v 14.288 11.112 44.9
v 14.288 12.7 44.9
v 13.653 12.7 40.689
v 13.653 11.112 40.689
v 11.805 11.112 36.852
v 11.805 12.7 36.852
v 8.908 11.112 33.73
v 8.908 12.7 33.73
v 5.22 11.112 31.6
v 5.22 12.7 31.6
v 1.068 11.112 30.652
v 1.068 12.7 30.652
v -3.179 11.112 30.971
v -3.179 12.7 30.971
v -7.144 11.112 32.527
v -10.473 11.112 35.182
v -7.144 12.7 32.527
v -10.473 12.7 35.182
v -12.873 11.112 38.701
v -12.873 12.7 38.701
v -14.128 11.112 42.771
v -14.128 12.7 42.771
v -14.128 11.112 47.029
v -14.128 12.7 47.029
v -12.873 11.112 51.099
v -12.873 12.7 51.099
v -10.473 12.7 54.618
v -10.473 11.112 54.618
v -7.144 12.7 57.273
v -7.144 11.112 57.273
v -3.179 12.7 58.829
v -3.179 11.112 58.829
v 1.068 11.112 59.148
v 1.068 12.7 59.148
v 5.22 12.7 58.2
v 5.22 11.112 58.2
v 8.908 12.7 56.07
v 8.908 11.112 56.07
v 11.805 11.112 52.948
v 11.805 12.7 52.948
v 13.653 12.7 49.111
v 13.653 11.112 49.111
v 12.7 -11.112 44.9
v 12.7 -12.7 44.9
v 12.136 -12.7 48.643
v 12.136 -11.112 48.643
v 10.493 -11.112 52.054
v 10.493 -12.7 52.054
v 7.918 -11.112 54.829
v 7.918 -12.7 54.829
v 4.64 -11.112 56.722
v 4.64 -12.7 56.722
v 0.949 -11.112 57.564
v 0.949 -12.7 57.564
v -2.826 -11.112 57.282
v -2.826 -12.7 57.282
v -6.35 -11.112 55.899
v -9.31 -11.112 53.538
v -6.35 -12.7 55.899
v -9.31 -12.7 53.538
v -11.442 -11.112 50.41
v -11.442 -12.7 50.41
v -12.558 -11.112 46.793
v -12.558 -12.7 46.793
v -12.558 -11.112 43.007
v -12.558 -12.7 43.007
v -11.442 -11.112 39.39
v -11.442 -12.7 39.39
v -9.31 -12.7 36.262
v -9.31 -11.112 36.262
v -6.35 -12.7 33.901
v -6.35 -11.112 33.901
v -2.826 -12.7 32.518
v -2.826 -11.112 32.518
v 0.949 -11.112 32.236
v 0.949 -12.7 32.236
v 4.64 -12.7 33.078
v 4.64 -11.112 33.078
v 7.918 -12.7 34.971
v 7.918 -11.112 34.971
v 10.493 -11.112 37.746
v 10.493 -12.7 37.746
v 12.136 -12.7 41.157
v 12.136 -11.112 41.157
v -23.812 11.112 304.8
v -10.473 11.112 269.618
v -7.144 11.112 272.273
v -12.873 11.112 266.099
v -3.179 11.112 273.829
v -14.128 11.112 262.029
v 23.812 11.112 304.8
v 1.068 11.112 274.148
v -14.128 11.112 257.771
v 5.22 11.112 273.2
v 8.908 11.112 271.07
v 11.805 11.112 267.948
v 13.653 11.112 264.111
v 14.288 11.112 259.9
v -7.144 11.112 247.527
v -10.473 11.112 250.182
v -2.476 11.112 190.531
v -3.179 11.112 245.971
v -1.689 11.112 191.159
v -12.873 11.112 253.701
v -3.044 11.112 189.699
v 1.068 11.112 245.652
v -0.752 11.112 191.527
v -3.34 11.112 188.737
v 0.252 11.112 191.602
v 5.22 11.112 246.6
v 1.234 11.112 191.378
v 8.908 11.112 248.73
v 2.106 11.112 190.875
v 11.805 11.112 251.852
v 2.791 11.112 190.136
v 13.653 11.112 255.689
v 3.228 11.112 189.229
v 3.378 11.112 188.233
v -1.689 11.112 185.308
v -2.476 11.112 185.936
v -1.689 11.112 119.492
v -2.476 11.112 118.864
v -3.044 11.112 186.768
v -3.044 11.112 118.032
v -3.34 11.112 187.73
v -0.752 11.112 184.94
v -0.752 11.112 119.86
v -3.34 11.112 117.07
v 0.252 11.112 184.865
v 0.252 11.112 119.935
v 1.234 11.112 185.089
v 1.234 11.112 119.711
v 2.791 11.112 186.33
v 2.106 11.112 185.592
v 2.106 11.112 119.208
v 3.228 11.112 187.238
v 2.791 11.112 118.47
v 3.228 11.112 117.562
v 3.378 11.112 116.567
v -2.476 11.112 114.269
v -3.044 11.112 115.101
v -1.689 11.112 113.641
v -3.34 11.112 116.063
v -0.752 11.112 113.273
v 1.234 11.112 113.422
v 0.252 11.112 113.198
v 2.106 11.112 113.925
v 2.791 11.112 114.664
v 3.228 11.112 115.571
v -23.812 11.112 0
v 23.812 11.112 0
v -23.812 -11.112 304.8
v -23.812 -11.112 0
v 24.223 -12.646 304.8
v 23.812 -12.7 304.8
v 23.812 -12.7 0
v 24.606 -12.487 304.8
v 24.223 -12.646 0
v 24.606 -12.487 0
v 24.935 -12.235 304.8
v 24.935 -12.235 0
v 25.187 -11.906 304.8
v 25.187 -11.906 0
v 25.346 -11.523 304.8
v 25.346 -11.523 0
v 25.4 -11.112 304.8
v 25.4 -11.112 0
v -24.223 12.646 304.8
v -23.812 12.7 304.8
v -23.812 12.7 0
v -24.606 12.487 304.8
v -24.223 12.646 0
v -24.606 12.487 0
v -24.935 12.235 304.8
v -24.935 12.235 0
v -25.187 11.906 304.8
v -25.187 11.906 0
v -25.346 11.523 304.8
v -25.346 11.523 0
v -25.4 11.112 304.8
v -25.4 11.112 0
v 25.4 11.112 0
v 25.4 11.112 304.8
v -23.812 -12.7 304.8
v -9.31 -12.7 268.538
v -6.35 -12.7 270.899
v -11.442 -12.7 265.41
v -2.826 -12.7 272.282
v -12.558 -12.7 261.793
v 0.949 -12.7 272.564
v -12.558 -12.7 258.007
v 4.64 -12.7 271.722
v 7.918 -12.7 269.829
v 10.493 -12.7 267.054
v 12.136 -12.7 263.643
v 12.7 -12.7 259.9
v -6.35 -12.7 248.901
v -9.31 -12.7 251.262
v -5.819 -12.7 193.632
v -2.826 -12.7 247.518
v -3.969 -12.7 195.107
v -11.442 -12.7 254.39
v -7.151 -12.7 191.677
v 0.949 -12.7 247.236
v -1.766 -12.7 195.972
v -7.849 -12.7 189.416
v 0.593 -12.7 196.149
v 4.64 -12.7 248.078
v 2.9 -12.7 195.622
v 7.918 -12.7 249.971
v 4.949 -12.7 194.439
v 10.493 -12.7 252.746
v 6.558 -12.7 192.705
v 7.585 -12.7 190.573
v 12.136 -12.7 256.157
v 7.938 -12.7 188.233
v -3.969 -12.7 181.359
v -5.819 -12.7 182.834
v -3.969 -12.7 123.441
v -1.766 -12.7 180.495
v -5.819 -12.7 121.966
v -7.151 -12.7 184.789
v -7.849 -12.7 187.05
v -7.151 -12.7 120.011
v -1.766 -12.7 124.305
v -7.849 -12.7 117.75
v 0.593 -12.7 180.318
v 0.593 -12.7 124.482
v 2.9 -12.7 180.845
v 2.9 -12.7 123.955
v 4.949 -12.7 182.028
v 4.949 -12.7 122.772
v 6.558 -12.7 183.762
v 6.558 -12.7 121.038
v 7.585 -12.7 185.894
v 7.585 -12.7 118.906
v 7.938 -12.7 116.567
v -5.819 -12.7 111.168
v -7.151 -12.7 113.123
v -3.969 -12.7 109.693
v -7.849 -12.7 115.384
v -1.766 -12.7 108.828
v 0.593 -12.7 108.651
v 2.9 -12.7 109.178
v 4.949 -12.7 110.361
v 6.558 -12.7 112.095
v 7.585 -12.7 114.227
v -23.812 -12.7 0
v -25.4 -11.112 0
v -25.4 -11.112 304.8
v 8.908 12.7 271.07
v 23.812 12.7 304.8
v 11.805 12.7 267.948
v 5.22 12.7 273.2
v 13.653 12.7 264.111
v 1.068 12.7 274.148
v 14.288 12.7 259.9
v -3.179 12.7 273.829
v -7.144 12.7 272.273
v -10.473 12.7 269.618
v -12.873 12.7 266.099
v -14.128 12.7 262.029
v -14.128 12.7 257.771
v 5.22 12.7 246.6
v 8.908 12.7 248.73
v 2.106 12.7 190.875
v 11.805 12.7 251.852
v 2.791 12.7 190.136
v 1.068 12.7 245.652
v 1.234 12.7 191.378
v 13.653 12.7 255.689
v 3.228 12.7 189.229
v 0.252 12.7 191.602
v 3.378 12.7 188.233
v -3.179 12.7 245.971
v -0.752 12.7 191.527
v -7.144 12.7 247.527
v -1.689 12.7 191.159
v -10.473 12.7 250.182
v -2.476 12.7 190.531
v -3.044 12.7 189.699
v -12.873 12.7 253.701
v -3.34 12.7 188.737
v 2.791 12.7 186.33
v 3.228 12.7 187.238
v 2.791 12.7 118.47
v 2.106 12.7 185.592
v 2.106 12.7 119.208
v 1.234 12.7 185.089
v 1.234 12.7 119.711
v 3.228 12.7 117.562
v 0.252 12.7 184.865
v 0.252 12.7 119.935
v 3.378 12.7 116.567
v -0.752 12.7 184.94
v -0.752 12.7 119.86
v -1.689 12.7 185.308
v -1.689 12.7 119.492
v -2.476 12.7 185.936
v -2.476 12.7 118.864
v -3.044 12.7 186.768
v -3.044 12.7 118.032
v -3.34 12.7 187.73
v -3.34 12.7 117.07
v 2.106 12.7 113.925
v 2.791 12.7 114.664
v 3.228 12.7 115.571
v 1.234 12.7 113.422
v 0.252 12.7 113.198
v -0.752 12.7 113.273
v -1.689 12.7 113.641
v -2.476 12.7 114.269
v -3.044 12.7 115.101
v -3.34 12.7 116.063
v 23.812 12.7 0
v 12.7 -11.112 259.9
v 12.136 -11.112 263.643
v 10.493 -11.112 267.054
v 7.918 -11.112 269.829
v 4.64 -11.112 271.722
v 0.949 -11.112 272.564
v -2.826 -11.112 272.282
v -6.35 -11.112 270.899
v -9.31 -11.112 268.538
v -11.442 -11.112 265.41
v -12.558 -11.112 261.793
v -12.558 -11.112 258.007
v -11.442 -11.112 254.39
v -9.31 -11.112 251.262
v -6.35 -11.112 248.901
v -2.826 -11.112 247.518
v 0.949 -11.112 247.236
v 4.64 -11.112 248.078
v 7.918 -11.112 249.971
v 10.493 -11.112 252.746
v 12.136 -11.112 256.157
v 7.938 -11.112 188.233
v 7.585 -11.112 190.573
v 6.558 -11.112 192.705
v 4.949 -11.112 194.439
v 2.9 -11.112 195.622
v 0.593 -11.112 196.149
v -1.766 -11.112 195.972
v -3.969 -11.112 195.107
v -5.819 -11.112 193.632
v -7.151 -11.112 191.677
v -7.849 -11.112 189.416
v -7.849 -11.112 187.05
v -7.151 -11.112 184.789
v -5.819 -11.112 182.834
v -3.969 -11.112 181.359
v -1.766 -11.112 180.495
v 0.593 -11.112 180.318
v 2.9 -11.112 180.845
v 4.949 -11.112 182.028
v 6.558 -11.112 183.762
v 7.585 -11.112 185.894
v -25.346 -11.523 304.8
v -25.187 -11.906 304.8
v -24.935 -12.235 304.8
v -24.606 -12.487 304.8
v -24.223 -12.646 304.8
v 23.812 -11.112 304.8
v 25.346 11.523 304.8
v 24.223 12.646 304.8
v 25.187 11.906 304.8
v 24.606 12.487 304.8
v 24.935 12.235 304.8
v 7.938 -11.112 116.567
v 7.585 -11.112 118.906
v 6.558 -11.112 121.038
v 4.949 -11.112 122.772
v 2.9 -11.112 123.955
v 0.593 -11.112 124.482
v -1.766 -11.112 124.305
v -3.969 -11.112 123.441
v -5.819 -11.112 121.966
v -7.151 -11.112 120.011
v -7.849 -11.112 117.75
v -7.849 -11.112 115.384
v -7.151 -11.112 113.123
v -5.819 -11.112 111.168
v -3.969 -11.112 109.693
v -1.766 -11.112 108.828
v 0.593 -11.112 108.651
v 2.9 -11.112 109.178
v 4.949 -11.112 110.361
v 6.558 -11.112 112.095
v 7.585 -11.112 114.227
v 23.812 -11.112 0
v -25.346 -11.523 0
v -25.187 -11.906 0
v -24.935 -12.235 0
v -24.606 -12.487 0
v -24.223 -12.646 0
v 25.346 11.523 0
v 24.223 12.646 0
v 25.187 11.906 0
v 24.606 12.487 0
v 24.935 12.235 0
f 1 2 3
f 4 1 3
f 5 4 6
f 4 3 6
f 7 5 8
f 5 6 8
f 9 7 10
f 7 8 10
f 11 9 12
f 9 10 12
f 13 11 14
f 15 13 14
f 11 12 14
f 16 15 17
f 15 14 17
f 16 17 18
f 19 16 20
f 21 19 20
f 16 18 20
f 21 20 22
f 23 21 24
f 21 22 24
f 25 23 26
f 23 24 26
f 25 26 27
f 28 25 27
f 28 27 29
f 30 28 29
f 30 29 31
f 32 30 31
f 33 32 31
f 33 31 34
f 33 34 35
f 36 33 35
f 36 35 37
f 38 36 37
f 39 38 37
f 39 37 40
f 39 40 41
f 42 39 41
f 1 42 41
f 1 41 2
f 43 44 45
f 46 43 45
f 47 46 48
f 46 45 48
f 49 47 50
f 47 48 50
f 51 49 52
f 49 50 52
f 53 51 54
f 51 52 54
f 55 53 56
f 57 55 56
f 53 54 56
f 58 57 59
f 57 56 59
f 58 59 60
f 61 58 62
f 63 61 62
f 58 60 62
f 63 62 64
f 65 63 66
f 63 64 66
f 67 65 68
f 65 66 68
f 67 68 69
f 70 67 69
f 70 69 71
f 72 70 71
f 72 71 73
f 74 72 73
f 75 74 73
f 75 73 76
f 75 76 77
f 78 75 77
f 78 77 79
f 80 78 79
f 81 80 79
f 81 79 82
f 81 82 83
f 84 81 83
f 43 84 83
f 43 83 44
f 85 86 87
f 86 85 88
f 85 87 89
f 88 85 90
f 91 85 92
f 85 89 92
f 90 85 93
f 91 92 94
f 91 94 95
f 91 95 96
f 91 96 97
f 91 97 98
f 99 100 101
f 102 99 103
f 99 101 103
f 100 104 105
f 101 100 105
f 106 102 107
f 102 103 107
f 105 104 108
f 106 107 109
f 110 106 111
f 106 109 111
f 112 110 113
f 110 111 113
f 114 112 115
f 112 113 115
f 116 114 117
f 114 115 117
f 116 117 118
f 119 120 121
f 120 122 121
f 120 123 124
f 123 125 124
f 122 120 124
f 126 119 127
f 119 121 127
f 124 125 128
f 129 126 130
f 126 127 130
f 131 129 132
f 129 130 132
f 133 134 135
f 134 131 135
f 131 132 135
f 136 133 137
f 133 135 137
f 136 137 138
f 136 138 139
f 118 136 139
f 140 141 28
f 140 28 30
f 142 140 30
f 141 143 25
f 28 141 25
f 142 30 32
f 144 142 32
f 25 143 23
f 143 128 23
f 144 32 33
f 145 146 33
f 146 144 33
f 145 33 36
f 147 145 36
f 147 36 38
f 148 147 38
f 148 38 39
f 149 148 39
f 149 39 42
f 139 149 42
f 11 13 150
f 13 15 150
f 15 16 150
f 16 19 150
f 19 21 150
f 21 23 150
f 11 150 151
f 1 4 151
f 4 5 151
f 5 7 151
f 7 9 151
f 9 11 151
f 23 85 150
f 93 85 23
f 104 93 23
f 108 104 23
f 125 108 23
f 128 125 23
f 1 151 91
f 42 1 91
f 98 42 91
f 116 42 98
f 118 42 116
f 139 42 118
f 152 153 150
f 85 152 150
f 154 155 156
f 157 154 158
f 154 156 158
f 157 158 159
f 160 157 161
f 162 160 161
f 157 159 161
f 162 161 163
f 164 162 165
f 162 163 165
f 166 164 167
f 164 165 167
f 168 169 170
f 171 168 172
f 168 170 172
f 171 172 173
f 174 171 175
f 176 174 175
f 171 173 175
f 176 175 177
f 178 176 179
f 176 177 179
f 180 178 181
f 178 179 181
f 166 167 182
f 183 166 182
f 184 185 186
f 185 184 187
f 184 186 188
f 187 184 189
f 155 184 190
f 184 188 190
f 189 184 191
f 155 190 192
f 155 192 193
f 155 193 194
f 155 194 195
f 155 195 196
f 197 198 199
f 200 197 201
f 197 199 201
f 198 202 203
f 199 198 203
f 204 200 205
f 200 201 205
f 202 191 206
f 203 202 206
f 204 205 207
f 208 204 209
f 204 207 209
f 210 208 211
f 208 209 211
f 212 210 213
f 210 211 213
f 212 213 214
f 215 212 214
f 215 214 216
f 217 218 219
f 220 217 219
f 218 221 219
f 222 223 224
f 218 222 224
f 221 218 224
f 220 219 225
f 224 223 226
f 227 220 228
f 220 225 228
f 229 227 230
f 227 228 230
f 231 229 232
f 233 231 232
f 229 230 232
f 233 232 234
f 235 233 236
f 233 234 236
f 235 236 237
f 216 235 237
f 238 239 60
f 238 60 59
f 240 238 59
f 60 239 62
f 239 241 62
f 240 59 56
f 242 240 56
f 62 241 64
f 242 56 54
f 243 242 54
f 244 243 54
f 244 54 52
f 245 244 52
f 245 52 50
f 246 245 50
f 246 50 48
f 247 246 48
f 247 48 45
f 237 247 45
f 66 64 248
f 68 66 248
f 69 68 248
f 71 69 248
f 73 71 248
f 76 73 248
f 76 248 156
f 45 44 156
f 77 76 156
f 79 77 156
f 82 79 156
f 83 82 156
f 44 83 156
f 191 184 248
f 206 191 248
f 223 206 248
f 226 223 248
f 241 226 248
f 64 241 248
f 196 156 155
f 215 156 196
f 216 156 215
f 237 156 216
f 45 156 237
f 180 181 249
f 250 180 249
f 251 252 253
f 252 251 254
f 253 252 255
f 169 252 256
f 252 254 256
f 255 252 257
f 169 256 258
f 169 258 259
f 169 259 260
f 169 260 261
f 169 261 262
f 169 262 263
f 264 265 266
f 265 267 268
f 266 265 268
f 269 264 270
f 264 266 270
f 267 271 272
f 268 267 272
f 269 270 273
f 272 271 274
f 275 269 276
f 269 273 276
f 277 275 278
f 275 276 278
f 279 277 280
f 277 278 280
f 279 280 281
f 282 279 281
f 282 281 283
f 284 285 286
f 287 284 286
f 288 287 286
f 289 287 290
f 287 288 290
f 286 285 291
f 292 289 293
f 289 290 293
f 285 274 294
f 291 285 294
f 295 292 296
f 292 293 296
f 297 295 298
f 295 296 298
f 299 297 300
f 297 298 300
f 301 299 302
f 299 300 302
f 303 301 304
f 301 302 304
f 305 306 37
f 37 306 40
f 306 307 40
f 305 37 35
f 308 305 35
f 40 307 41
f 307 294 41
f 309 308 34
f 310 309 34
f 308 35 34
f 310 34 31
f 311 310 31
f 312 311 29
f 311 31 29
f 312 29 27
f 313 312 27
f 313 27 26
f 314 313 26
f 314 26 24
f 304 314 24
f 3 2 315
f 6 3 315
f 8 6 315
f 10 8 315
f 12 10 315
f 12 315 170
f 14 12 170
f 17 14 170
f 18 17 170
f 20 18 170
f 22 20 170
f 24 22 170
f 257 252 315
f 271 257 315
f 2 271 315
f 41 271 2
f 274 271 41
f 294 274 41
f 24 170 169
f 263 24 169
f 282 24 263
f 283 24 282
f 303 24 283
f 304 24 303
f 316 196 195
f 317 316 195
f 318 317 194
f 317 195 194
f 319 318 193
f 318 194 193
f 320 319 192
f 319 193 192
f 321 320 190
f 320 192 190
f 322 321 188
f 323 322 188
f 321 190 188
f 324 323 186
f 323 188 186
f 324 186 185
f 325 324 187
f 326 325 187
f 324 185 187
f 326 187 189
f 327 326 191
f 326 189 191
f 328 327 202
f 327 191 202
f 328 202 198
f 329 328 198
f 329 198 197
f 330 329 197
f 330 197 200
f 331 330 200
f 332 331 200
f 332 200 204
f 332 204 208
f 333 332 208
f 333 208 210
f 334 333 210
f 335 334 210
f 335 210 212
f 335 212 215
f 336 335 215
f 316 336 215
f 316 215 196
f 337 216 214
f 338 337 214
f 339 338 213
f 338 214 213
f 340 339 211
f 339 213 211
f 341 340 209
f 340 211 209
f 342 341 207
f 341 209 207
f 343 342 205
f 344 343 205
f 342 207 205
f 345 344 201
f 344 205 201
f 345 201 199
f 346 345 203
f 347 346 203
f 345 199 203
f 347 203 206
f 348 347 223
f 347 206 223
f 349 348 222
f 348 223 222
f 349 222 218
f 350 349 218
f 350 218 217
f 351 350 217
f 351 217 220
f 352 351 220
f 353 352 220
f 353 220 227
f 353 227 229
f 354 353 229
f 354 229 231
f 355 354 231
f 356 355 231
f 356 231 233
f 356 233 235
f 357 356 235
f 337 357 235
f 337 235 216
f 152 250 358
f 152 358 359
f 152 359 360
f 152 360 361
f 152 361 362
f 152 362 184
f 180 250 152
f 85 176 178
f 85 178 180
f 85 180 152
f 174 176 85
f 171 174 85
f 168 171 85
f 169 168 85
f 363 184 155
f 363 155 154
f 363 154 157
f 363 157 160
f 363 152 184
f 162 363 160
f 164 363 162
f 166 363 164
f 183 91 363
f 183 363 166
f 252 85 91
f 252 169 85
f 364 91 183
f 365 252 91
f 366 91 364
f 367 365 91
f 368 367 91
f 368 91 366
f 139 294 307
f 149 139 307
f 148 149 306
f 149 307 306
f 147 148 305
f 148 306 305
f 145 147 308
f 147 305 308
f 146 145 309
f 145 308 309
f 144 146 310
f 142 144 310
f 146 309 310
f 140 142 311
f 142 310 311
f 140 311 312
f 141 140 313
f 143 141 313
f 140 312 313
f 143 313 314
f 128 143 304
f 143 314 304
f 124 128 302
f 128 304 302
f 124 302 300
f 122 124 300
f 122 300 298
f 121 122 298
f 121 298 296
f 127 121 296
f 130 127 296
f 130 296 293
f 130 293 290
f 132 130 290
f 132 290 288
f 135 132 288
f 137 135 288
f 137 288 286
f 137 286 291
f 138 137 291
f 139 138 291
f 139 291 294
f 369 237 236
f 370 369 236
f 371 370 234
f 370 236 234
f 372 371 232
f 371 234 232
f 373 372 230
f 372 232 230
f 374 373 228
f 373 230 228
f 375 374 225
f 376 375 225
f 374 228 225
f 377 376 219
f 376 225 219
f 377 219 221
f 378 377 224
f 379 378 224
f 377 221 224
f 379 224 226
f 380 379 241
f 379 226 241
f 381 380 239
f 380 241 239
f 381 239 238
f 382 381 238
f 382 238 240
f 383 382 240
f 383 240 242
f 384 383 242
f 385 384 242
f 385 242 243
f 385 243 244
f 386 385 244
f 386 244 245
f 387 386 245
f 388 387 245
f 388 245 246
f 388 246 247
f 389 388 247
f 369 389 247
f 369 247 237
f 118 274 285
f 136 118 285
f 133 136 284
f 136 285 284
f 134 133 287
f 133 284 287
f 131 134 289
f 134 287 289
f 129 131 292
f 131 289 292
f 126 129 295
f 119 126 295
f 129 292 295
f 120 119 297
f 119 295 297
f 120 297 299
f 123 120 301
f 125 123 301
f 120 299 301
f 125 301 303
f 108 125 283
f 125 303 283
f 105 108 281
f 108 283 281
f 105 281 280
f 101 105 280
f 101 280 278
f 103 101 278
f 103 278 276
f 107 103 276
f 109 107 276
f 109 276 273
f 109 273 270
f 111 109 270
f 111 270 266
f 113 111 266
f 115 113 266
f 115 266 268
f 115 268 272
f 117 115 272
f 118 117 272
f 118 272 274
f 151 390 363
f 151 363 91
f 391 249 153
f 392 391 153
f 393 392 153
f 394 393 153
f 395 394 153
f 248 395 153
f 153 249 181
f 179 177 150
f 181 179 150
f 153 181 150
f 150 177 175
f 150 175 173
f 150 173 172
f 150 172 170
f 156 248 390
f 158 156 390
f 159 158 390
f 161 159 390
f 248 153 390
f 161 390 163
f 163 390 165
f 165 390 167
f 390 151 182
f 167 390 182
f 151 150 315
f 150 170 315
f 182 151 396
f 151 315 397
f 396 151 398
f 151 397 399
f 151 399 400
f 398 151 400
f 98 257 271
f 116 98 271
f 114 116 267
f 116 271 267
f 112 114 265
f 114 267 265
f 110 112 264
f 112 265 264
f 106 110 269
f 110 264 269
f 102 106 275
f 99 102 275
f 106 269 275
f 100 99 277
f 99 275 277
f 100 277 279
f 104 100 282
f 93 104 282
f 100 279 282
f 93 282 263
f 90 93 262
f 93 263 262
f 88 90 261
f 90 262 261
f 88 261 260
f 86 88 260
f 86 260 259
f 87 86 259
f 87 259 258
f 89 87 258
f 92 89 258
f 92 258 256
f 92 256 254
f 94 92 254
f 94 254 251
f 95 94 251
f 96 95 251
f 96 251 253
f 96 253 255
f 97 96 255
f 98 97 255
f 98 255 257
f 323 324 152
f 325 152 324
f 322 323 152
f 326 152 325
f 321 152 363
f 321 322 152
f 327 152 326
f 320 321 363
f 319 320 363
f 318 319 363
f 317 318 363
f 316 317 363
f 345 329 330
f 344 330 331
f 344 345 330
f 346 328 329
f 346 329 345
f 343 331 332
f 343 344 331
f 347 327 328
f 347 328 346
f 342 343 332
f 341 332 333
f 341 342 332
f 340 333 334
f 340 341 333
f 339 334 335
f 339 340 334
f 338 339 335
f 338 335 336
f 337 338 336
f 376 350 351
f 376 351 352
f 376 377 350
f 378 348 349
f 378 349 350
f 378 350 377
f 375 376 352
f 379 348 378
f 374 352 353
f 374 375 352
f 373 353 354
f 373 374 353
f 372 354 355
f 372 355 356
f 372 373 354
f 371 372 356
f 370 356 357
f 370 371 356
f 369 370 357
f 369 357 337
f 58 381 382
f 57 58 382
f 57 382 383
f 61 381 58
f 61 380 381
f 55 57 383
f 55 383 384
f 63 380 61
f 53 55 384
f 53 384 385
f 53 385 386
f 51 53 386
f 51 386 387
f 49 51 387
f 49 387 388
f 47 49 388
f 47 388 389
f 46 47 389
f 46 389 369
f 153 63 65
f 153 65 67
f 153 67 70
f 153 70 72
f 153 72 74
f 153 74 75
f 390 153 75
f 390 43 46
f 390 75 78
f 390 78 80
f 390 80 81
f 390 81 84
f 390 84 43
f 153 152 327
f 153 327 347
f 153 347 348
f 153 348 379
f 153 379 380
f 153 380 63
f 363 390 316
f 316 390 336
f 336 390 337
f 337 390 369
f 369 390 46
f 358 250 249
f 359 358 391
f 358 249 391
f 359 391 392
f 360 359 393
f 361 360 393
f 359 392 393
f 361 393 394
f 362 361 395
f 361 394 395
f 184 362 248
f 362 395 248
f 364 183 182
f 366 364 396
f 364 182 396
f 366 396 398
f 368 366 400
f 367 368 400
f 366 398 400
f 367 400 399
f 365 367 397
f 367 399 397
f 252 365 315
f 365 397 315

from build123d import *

# Parameters (mm, degrees)
SKETCH1_W                      = 47.625
SKETCH1_H                      = 22.225
BOSS_EXTRUDE1_DEPTH            = 304.8
CUT_EXTRUDE1_REACH             = 27.4
SKETCH2_R                      = 14.2875
CUT_EXTRUDE1_DIRECTION_2_DEPTH = 1
CUT_EXTRUDE2_REACH             = 27.4
SKETCH3_R                      = 12.7
CUT_EXTRUDE2_DIRECTION_2_DEPTH = 1
CUT_EXTRUDE3_REACH             = 27.4
SKETCH4_R                      = 3.3782
CUT_EXTRUDE3_DIRECTION_2_DEPTH = 1
CUT_EXTRUDE4_REACH             = 27.4
SKETCH5_R                      = 7.9375
CUT_EXTRUDE4_DIRECTION_2_DEPTH = 1


with BuildPart() as part:
    # Sketch1 → Boss-Extrude1 (new body)
    with BuildSketch(Plane.XY):
        with BuildLine():
            Line((-23.8125, -12.7), (23.8125, -12.7))
            ThreePointArc((23.8125, -12.7), (24.935032015, -12.235032015), (25.4, -11.1125))
            Line((25.4, -11.1125), (25.4, 11.1125))
            ThreePointArc((25.4, 11.1125), (24.935032015, 12.235032015), (23.8125, 12.7))
            Line((23.8125, 12.7), (-23.8125, 12.7))
            ThreePointArc((-23.8125, 12.7), (-24.935032015, 12.235032015), (-25.4, 11.1125))
            Line((-25.4, 11.1125), (-25.4, -11.1125))
            ThreePointArc((-25.4, -11.1125), (-24.935032015, -12.235032015), (-23.8125, -12.7))
        make_face()
        Rectangle(SKETCH1_W, SKETCH1_H, mode=Mode.SUBTRACT)
    extrude(amount=BOSS_EXTRUDE1_DEPTH)

    # Sketch2 → Cut-Extrude1 (cut, up to next)
    with BuildSketch(Plane(origin=(0, 12.7, 0), x_dir=(1, 0, 0), z_dir=(0, 1, 0)), mode=Mode.PRIVATE) as cut_extrude1_sk1:
        with Locations((0, -259.900000011)):
            Circle(SKETCH2_R)
    cut_extrude1_tool1 = extrude(cut_extrude1_sk1.sketch, amount=-CUT_EXTRUDE1_REACH, mode=Mode.PRIVATE) & part.part
    add(cut_extrude1_tool1.solids().sort_by_distance((0, 12.7, 259.9))[0], mode=Mode.SUBTRACT)
    # Sketch2 → Cut-Extrude1 (cut, up to next)
    with BuildSketch(Plane(origin=(0, 12.7, 0), x_dir=(1, 0, 0), z_dir=(0, 1, 0)), mode=Mode.PRIVATE) as cut_extrude1_sk2:
        with Locations((0, -44.899999989)):
            Circle(SKETCH2_R)
    cut_extrude1_tool2 = extrude(cut_extrude1_sk2.sketch, amount=-CUT_EXTRUDE1_REACH, mode=Mode.PRIVATE) & part.part
    add(cut_extrude1_tool2.solids().sort_by_distance((0, 12.7, 44.9))[0], mode=Mode.SUBTRACT)

    # Sketch2 → Cut-Extrude1 direction 2 (cut)
    with BuildSketch(Plane(origin=(0, 12.7, 0), x_dir=(1, 0, 0), z_dir=(0, 1, 0))):
        with Locations((0, -259.900000011)):
            Circle(SKETCH2_R)
        with Locations((0, -44.899999989)):
            Circle(SKETCH2_R)
    extrude(amount=CUT_EXTRUDE1_DIRECTION_2_DEPTH, mode=Mode.SUBTRACT)

    # Sketch3 → Cut-Extrude2 (cut, up to next)
    with BuildSketch(Plane.XZ.offset(12.7), mode=Mode.PRIVATE) as cut_extrude2_sk1:
        with Locations((0, 44.899999989)):
            Circle(SKETCH3_R)
    cut_extrude2_tool1 = extrude(cut_extrude2_sk1.sketch, amount=-CUT_EXTRUDE2_REACH, mode=Mode.PRIVATE) & part.part
    add(cut_extrude2_tool1.solids().sort_by_distance((0, -12.7, 44.9))[0], mode=Mode.SUBTRACT)
    # Sketch3 → Cut-Extrude2 (cut, up to next)
    with BuildSketch(Plane.XZ.offset(12.7), mode=Mode.PRIVATE) as cut_extrude2_sk2:
        with Locations((0, 259.900000011)):
            Circle(SKETCH3_R)
    cut_extrude2_tool2 = extrude(cut_extrude2_sk2.sketch, amount=-CUT_EXTRUDE2_REACH, mode=Mode.PRIVATE) & part.part
    add(cut_extrude2_tool2.solids().sort_by_distance((0, -12.7, 259.9))[0], mode=Mode.SUBTRACT)

    # Sketch3 → Cut-Extrude2 direction 2 (cut)
    with BuildSketch(Plane.XZ.offset(12.7)):
        with Locations((0, 44.899999989)):
            Circle(SKETCH3_R)
        with Locations((0, 259.900000011)):
            Circle(SKETCH3_R)
    extrude(amount=CUT_EXTRUDE2_DIRECTION_2_DEPTH, mode=Mode.SUBTRACT)

    # Sketch4 → Cut-Extrude3 (cut, up to next)
    with BuildSketch(Plane(origin=(0, 12.7, 0), x_dir=(1, 0, 0), z_dir=(0, 1, 0)), mode=Mode.PRIVATE) as cut_extrude3_sk1:
        with Locations((0, -188.233332829)):
            Circle(SKETCH4_R)
    cut_extrude3_tool1 = extrude(cut_extrude3_sk1.sketch, amount=-CUT_EXTRUDE3_REACH, mode=Mode.PRIVATE) & part.part
    add(cut_extrude3_tool1.solids().sort_by_distance((0, 12.7, 188.233333))[0], mode=Mode.SUBTRACT)
    # Sketch4 → Cut-Extrude3 (cut, up to next)
    with BuildSketch(Plane(origin=(0, 12.7, 0), x_dir=(1, 0, 0), z_dir=(0, 1, 0)), mode=Mode.PRIVATE) as cut_extrude3_sk2:
        with Locations((0, -116.566667171)):
            Circle(SKETCH4_R)
    cut_extrude3_tool2 = extrude(cut_extrude3_sk2.sketch, amount=-CUT_EXTRUDE3_REACH, mode=Mode.PRIVATE) & part.part
    add(cut_extrude3_tool2.solids().sort_by_distance((0, 12.7, 116.566667))[0], mode=Mode.SUBTRACT)

    # Sketch4 → Cut-Extrude3 direction 2 (cut)
    with BuildSketch(Plane(origin=(0, 12.7, 0), x_dir=(1, 0, 0), z_dir=(0, 1, 0))):
        with Locations((0, -188.233332829)):
            Circle(SKETCH4_R)
        with Locations((0, -116.566667171)):
            Circle(SKETCH4_R)
    extrude(amount=CUT_EXTRUDE3_DIRECTION_2_DEPTH, mode=Mode.SUBTRACT)

    # Sketch5 → Cut-Extrude4 (cut, up to next)
    with BuildSketch(Plane.XZ.offset(12.7), mode=Mode.PRIVATE) as cut_extrude4_sk1:
        with Locations((0, 116.566667171)):
            Circle(SKETCH5_R)
    cut_extrude4_tool1 = extrude(cut_extrude4_sk1.sketch, amount=-CUT_EXTRUDE4_REACH, mode=Mode.PRIVATE) & part.part
    add(cut_extrude4_tool1.solids().sort_by_distance((0, -12.7, 116.566667))[0], mode=Mode.SUBTRACT)
    # Sketch5 → Cut-Extrude4 (cut, up to next)
    with BuildSketch(Plane.XZ.offset(12.7), mode=Mode.PRIVATE) as cut_extrude4_sk2:
        with Locations((0, 188.233332829)):
            Circle(SKETCH5_R)
    cut_extrude4_tool2 = extrude(cut_extrude4_sk2.sketch, amount=-CUT_EXTRUDE4_REACH, mode=Mode.PRIVATE) & part.part
    add(cut_extrude4_tool2.solids().sort_by_distance((0, -12.7, 188.233333))[0], mode=Mode.SUBTRACT)

    # Sketch5 → Cut-Extrude4 direction 2 (cut)
    with BuildSketch(Plane.XZ.offset(12.7)):
        with Locations((0, 116.566667171)):
            Circle(SKETCH5_R)
        with Locations((0, 188.233332829)):
            Circle(SKETCH5_R)
    extrude(amount=CUT_EXTRUDE4_DIRECTION_2_DEPTH, mode=Mode.SUBTRACT)


solid = part.part
